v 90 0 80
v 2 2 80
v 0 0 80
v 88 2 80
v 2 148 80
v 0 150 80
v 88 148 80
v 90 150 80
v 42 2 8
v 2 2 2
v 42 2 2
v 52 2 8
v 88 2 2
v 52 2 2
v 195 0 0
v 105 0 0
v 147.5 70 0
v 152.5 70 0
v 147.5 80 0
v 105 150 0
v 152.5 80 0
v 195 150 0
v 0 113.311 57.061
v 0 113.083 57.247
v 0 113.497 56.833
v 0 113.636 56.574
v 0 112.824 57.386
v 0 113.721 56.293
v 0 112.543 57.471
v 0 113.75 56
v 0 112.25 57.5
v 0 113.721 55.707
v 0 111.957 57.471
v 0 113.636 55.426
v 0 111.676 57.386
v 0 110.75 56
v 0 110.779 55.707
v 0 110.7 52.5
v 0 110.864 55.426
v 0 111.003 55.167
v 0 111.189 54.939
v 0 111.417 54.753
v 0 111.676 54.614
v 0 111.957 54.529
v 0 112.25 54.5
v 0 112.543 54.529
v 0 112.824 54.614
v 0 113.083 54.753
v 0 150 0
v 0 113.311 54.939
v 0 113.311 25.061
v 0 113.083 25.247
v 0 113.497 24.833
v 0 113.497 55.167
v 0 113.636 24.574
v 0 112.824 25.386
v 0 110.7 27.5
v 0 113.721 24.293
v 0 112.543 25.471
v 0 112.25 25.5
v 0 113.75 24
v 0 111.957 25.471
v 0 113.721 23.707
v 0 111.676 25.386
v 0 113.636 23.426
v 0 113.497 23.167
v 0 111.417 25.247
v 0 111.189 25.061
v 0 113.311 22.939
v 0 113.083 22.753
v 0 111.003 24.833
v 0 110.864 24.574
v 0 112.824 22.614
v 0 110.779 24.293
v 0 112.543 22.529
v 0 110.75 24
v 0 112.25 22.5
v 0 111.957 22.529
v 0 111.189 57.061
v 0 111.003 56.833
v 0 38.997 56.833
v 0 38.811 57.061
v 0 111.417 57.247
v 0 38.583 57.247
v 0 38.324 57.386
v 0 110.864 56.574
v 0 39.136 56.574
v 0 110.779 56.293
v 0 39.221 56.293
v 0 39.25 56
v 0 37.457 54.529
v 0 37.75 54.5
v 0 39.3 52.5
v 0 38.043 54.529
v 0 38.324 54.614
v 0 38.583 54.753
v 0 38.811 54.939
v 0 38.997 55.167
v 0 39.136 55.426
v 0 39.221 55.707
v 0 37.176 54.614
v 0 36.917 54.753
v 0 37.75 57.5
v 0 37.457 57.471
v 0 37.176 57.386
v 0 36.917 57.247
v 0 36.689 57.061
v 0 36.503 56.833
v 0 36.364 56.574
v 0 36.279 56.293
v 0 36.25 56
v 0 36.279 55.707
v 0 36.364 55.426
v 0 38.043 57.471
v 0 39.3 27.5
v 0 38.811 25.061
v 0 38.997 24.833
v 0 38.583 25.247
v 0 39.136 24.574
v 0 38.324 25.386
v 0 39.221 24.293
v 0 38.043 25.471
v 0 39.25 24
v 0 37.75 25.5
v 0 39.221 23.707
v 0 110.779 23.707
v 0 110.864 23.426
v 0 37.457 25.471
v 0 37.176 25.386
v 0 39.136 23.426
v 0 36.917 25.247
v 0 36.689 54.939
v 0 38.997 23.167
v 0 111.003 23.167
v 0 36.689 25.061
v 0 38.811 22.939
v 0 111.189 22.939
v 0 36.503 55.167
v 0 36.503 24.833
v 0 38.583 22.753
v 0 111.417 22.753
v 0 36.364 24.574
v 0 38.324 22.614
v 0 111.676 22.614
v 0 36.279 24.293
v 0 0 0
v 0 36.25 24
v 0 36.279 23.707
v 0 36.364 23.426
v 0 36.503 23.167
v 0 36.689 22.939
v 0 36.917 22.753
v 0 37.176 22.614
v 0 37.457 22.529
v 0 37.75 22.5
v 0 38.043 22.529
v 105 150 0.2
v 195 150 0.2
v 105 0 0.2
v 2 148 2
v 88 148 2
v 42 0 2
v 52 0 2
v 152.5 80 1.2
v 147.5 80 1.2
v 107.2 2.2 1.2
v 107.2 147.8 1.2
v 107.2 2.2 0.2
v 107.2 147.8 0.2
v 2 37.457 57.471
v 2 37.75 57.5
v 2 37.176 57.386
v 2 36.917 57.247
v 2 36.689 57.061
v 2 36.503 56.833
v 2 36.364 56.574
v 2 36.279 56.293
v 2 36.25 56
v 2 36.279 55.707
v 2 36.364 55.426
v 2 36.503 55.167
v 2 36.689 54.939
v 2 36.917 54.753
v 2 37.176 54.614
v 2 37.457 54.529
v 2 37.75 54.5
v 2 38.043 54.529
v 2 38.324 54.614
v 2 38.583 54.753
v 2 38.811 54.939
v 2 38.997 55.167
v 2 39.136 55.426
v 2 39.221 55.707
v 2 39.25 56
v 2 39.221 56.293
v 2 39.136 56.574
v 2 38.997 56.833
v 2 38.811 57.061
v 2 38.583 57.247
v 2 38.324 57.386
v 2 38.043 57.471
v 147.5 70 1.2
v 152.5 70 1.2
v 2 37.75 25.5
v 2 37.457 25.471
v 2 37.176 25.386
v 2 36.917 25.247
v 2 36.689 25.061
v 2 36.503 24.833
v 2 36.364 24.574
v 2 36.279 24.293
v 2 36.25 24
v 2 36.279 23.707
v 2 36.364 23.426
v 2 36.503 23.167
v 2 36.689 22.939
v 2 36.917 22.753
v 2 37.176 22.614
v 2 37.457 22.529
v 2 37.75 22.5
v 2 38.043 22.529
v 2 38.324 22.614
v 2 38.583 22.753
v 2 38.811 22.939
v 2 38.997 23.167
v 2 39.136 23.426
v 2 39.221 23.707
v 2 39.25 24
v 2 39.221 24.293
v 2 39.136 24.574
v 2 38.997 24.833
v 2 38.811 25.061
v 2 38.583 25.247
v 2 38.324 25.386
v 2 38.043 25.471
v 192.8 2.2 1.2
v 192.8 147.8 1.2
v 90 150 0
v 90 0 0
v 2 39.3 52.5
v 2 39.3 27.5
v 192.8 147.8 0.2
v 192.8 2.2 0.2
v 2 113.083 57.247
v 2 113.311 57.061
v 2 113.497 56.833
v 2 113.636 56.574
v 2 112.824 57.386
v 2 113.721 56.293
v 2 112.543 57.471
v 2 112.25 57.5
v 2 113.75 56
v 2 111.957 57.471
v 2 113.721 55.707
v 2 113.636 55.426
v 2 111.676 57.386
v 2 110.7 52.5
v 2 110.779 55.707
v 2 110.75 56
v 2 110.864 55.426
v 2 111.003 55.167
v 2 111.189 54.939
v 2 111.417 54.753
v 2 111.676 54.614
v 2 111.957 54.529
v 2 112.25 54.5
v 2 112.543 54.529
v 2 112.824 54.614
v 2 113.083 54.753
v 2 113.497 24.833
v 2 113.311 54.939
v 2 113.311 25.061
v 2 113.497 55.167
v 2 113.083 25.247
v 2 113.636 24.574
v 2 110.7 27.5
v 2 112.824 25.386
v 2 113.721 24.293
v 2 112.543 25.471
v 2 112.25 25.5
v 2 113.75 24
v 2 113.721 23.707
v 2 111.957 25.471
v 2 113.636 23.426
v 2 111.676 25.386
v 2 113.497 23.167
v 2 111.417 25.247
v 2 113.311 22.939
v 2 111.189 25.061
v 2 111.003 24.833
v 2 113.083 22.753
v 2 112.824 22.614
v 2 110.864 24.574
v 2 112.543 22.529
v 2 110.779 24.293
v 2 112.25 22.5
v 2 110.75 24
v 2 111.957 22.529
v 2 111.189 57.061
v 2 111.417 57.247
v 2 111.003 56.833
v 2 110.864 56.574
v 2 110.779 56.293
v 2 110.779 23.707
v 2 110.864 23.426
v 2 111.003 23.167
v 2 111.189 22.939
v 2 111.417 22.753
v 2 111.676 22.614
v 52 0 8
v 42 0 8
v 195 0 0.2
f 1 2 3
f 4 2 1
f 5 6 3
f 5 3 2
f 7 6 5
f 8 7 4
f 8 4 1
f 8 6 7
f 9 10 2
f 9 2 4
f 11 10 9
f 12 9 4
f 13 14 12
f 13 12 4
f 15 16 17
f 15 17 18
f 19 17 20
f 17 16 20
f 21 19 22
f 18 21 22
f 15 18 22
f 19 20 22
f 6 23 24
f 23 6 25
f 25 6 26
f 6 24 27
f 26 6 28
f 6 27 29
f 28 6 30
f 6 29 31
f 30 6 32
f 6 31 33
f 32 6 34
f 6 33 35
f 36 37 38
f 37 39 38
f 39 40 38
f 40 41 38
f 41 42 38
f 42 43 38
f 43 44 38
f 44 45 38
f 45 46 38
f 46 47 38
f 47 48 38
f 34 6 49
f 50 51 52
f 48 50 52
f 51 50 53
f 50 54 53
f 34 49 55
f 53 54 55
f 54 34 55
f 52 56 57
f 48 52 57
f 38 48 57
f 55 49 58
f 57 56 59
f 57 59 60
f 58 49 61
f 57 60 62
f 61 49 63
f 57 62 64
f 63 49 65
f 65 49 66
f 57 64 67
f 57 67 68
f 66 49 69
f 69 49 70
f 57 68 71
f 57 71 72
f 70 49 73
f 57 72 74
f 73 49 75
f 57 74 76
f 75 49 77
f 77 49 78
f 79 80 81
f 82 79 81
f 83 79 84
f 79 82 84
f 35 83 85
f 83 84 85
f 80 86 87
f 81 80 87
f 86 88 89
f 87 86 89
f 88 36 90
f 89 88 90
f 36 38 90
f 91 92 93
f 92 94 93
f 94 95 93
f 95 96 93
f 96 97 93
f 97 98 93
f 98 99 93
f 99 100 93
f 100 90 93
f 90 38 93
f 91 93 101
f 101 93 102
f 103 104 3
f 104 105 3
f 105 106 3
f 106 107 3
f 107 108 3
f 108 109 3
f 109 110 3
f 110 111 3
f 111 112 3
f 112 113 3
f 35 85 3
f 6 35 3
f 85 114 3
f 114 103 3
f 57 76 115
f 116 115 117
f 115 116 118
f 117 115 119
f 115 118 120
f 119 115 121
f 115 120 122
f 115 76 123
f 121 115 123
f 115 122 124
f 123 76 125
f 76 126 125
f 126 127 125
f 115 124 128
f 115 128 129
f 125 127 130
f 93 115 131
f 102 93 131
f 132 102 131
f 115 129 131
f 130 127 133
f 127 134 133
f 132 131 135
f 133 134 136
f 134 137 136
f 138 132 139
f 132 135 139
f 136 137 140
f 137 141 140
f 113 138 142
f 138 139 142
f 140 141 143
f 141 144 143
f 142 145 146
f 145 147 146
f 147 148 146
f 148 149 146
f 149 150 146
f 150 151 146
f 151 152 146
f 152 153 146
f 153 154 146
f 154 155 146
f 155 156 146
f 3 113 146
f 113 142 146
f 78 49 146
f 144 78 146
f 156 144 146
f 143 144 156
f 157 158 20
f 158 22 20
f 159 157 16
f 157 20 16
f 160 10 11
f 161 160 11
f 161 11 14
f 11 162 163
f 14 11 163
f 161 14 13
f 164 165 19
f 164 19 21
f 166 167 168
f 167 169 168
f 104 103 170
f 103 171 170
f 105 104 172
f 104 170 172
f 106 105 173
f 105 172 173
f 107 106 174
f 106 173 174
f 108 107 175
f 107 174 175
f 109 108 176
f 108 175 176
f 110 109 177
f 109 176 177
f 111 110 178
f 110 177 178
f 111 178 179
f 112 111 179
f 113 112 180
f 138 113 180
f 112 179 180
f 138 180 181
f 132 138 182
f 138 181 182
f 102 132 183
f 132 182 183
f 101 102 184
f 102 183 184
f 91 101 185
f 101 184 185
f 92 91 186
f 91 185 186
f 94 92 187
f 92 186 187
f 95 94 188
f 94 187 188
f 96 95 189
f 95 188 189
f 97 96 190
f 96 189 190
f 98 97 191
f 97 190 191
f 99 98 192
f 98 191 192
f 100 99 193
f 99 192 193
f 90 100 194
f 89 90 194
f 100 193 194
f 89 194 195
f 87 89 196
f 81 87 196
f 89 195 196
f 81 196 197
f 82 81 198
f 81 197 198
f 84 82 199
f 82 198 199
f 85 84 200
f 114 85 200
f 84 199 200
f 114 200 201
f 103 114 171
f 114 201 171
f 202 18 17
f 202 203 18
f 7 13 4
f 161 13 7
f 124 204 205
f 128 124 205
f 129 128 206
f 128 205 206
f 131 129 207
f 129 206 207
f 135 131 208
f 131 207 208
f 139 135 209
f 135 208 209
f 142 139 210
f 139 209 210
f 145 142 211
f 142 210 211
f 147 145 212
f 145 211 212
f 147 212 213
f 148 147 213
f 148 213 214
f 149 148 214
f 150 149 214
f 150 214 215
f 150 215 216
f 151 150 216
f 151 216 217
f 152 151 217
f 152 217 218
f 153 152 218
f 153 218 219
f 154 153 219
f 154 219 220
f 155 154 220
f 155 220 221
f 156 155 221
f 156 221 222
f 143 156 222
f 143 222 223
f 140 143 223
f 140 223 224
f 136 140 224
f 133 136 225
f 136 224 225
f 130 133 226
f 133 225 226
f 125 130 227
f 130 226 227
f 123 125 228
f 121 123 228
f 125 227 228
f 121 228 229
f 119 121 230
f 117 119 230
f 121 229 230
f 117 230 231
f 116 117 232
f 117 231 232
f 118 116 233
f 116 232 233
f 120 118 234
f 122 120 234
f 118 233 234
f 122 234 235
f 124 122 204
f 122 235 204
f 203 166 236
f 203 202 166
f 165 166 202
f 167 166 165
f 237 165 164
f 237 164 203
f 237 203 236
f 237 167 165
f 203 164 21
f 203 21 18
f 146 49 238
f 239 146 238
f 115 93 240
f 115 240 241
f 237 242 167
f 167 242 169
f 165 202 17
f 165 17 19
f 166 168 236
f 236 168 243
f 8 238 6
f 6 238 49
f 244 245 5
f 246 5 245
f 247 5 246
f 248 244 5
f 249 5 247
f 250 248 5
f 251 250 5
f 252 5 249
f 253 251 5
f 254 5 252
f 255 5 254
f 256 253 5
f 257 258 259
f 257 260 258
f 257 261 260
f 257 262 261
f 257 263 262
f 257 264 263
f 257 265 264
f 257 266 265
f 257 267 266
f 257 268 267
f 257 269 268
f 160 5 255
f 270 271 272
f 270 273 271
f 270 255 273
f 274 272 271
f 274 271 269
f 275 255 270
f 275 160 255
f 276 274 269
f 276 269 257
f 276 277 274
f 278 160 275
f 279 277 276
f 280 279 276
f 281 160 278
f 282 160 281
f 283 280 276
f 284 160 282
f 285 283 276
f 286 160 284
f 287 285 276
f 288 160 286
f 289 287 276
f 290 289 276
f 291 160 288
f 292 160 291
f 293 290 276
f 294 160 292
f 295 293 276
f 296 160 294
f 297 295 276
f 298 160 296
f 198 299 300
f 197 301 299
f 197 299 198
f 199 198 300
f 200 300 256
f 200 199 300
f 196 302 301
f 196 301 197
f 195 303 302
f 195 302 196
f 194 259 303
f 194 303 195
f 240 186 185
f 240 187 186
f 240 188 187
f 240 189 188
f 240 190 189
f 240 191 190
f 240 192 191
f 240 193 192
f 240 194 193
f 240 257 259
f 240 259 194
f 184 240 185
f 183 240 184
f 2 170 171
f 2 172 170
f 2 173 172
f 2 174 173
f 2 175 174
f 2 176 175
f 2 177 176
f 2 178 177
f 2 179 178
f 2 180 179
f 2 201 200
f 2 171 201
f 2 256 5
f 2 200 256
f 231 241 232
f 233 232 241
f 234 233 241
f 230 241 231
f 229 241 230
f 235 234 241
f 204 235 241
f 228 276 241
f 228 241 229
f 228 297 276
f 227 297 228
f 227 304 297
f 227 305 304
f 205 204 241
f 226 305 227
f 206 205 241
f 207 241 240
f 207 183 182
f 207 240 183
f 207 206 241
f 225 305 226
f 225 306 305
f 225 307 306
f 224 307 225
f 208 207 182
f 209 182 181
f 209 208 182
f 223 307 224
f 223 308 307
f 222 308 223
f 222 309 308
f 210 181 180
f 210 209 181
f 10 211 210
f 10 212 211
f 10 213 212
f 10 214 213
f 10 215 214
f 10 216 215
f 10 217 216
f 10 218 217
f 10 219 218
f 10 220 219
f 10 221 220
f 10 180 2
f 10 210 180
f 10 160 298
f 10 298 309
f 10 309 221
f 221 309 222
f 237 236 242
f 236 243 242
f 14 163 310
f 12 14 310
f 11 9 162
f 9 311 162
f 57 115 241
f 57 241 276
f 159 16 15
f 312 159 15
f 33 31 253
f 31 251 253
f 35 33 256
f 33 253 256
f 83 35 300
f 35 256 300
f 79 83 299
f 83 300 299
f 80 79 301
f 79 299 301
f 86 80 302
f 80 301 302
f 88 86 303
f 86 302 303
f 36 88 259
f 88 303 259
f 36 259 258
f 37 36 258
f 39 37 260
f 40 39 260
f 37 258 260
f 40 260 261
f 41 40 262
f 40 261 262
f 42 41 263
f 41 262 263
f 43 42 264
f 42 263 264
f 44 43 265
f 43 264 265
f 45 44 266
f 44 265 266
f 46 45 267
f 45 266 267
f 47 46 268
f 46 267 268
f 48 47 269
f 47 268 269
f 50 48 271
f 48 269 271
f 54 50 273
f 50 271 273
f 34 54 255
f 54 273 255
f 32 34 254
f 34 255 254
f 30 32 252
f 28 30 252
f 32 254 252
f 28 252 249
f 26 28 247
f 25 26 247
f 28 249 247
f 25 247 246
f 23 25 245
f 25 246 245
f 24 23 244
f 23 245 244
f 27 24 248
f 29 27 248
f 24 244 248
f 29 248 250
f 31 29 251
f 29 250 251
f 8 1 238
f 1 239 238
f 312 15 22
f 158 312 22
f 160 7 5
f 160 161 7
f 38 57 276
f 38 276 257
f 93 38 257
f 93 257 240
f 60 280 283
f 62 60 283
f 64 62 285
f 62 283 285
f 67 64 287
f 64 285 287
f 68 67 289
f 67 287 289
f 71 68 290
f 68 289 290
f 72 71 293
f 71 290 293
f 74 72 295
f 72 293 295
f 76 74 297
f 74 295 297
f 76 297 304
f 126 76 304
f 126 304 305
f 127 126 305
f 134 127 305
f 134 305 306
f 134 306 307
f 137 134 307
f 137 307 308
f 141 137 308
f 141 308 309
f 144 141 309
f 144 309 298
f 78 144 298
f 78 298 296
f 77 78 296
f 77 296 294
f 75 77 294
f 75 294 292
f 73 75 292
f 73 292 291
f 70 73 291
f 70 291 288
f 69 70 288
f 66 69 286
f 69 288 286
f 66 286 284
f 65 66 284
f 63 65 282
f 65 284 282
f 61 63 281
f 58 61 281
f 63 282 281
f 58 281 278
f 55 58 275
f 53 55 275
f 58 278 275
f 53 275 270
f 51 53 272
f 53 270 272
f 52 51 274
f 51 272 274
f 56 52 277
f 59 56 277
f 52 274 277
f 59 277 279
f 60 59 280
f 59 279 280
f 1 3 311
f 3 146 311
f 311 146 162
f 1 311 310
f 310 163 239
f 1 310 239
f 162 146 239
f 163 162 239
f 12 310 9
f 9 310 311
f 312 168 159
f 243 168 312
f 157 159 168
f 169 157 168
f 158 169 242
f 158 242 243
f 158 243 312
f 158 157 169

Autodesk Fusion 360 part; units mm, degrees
sketch "Esquisse1" plane through (0, 0, 0) normal (0, 0, 1) x (1, 0, 0)
  line L0 (0, 0) -> (90, 0)
  line L1 (90, 0) -> (90, 150)
  line L2 (90, 150) -> (0, 150)
  line L3 (0, 150) -> (0, 0)
  dimension "d42" = 90
  dimension "d43" = 150
extrude "Extrusion1" add sketch "Esquisse1" along normal blind 80 makes body 1
shell "Coque1" thickness 2 removed faces 1 at (30, 100, 80) on bodies 1
sketch "Esquisse2" plane through (0, 0, 0) normal (-1, 0, 0) x (0, -1, 0)
  line L0 (-150, 0) -> (0, 0)
  line L1 (0, 0) -> (0, 80)
  line L2 (0, 80) -> (-150, 80)
  line L3 (-150, 80) -> (-150, 0)
  line L4 (-110.7, 52.5) -> (-39.3, 52.5)
  line L5 (-39.3, 52.5) -> (-39.3, 27.5)
  line L6 (-39.3, 27.5) -> (-110.7, 27.5)
  line L7 (-110.7, 27.5) -> (-110.7, 52.5)
  line L8 (-150, 40) -> (-110.7, 40) construction
  line L9 (-39.3, 40) -> (0, 40) construction
  line L10 (-112.25, 24) -> (-37.75, 24) construction
  line L11 (-37.75, 24) -> (-37.75, 56) construction
  line L12 (-37.75, 56) -> (-112.25, 56) construction
  line L13 (-112.25, 56) -> (-112.25, 24) construction
  line L14 (-75, 56) -> (-75, 80)
  line L15 (-75, 24) -> (-75, 0)
  dimension "d32" = 25
  dimension "d33" = 71.4
  dimension "d40" = 1.55
  dimension "d41" = 3.5
extrude "Extrusion2" cut sketch "Esquisse2" against normal blind 10 contours L4 L5 L6 L7 bodies 1
sketch "Esquisse6" plane through (0, 0, 0) normal (0, -1, 0) x (1, 0, 0)
  line L0 (0, 0) -> (90, 0)
  line L1 (90, 0) -> (90, 80)
  line L2 (90, 80) -> (0, 80)
  line L3 (0, 80) -> (0, 0)
  line L4 (42, 2) -> (52, 2)
  line L5 (52, 2) -> (52, 8)
  line L6 (52, 8) -> (42, 8)
  line L7 (42, 8) -> (42, 2)
extrude "Extrusion5" cut sketch "Esquisse6" against normal blind 2 contours L4 L5 L6 L7 bodies 1
sketch "Esquisse9" plane through (0, 0, 0) normal (0, 0, 1) x (1, 0, 0)
  line L0 (105, 0) -> (195, 0)
  line L1 (195, 0) -> (195, 150)
  line L2 (195, 150) -> (105, 150)
  line L3 (105, 150) -> (105, 0)
  line L4 (192.8, 147.8) -> (107.2, 147.8)
  line L5 (107.2, 147.8) -> (107.2, 2.2)
  line L6 (107.2, 2.2) -> (192.8, 2.2)
  line L7 (192.8, 2.2) -> (192.8, 147.8)
  line L8 (0, 0) -> (90, 0)
  line L9 (90, 150) -> (0, 150)
  dimension "d34" = -2.2
  dimension "d35" = 15
extrude "Extrusion9" add sketch "Esquisse9" along normal blind 0.2 separate body contours L0 L1 L2 L3 | L4 L5 L6 L7 makes body 2
extrude "Extrusion10" add sketch "Esquisse9" along normal blind 1.2 contours L4 L5 L6 L7 bodies 2
sketch "Esquisse11" plane through (0, 0, 1.2) normal (0, 0, 1) x (-1, 0, 0)
  line L0 (-152.5, -70) -> (-147.5, -70)
  line L1 (-147.5, -70) -> (-147.5, -80)
  line L2 (-147.5, -80) -> (-152.5, -80)
  line L3 (-152.5, -80) -> (-152.5, -70)
  line L4 (-192.8, -2.2) -> (-192.8, -147.8)
  line L5 (-192.8, -147.8) -> (-107.2, -147.8)
  line L6 (-107.2, -147.8) -> (-107.2, -2.2)
  line L7 (-107.2, -2.2) -> (-192.8, -2.2)
  line L8 (-192.8, -2.2) -> (-192.8, -147.8)
  line L9 (-107.2, -147.8) -> (-107.2, -2.2)
  line L10 (-150, -70) -> (-150, -2.2) construction
  line L11 (-150, -80) -> (-150, -147.8) construction
  line L12 (-192.8, -75) -> (-152.5, -75) construction
  line L13 (-147.5, -75) -> (-107.2, -75) construction
  dimension "d28" = 5
  dimension "d29" = 10
extrude "Extrusion11" cut sketch "Esquisse11" against normal up to surface (1.2 mm away) contours L0 L1 L2 L3 bodies 2
hole "Perçage2" at (0, 112.25, 56) at (0, 37.75, 56) at (0, 37.75, 24) at (0, 112.25, 24) direction (1, 0, 0) diameter 3 depth 3 tip angle 118 bodies 1
equation "d26 = 0.2 mm + 1 mm"
equation "d40 = 4.25 mm - 2.5 mm - 0.2 mm"
equation "d41 = 6 mm - 2.5 mm"
